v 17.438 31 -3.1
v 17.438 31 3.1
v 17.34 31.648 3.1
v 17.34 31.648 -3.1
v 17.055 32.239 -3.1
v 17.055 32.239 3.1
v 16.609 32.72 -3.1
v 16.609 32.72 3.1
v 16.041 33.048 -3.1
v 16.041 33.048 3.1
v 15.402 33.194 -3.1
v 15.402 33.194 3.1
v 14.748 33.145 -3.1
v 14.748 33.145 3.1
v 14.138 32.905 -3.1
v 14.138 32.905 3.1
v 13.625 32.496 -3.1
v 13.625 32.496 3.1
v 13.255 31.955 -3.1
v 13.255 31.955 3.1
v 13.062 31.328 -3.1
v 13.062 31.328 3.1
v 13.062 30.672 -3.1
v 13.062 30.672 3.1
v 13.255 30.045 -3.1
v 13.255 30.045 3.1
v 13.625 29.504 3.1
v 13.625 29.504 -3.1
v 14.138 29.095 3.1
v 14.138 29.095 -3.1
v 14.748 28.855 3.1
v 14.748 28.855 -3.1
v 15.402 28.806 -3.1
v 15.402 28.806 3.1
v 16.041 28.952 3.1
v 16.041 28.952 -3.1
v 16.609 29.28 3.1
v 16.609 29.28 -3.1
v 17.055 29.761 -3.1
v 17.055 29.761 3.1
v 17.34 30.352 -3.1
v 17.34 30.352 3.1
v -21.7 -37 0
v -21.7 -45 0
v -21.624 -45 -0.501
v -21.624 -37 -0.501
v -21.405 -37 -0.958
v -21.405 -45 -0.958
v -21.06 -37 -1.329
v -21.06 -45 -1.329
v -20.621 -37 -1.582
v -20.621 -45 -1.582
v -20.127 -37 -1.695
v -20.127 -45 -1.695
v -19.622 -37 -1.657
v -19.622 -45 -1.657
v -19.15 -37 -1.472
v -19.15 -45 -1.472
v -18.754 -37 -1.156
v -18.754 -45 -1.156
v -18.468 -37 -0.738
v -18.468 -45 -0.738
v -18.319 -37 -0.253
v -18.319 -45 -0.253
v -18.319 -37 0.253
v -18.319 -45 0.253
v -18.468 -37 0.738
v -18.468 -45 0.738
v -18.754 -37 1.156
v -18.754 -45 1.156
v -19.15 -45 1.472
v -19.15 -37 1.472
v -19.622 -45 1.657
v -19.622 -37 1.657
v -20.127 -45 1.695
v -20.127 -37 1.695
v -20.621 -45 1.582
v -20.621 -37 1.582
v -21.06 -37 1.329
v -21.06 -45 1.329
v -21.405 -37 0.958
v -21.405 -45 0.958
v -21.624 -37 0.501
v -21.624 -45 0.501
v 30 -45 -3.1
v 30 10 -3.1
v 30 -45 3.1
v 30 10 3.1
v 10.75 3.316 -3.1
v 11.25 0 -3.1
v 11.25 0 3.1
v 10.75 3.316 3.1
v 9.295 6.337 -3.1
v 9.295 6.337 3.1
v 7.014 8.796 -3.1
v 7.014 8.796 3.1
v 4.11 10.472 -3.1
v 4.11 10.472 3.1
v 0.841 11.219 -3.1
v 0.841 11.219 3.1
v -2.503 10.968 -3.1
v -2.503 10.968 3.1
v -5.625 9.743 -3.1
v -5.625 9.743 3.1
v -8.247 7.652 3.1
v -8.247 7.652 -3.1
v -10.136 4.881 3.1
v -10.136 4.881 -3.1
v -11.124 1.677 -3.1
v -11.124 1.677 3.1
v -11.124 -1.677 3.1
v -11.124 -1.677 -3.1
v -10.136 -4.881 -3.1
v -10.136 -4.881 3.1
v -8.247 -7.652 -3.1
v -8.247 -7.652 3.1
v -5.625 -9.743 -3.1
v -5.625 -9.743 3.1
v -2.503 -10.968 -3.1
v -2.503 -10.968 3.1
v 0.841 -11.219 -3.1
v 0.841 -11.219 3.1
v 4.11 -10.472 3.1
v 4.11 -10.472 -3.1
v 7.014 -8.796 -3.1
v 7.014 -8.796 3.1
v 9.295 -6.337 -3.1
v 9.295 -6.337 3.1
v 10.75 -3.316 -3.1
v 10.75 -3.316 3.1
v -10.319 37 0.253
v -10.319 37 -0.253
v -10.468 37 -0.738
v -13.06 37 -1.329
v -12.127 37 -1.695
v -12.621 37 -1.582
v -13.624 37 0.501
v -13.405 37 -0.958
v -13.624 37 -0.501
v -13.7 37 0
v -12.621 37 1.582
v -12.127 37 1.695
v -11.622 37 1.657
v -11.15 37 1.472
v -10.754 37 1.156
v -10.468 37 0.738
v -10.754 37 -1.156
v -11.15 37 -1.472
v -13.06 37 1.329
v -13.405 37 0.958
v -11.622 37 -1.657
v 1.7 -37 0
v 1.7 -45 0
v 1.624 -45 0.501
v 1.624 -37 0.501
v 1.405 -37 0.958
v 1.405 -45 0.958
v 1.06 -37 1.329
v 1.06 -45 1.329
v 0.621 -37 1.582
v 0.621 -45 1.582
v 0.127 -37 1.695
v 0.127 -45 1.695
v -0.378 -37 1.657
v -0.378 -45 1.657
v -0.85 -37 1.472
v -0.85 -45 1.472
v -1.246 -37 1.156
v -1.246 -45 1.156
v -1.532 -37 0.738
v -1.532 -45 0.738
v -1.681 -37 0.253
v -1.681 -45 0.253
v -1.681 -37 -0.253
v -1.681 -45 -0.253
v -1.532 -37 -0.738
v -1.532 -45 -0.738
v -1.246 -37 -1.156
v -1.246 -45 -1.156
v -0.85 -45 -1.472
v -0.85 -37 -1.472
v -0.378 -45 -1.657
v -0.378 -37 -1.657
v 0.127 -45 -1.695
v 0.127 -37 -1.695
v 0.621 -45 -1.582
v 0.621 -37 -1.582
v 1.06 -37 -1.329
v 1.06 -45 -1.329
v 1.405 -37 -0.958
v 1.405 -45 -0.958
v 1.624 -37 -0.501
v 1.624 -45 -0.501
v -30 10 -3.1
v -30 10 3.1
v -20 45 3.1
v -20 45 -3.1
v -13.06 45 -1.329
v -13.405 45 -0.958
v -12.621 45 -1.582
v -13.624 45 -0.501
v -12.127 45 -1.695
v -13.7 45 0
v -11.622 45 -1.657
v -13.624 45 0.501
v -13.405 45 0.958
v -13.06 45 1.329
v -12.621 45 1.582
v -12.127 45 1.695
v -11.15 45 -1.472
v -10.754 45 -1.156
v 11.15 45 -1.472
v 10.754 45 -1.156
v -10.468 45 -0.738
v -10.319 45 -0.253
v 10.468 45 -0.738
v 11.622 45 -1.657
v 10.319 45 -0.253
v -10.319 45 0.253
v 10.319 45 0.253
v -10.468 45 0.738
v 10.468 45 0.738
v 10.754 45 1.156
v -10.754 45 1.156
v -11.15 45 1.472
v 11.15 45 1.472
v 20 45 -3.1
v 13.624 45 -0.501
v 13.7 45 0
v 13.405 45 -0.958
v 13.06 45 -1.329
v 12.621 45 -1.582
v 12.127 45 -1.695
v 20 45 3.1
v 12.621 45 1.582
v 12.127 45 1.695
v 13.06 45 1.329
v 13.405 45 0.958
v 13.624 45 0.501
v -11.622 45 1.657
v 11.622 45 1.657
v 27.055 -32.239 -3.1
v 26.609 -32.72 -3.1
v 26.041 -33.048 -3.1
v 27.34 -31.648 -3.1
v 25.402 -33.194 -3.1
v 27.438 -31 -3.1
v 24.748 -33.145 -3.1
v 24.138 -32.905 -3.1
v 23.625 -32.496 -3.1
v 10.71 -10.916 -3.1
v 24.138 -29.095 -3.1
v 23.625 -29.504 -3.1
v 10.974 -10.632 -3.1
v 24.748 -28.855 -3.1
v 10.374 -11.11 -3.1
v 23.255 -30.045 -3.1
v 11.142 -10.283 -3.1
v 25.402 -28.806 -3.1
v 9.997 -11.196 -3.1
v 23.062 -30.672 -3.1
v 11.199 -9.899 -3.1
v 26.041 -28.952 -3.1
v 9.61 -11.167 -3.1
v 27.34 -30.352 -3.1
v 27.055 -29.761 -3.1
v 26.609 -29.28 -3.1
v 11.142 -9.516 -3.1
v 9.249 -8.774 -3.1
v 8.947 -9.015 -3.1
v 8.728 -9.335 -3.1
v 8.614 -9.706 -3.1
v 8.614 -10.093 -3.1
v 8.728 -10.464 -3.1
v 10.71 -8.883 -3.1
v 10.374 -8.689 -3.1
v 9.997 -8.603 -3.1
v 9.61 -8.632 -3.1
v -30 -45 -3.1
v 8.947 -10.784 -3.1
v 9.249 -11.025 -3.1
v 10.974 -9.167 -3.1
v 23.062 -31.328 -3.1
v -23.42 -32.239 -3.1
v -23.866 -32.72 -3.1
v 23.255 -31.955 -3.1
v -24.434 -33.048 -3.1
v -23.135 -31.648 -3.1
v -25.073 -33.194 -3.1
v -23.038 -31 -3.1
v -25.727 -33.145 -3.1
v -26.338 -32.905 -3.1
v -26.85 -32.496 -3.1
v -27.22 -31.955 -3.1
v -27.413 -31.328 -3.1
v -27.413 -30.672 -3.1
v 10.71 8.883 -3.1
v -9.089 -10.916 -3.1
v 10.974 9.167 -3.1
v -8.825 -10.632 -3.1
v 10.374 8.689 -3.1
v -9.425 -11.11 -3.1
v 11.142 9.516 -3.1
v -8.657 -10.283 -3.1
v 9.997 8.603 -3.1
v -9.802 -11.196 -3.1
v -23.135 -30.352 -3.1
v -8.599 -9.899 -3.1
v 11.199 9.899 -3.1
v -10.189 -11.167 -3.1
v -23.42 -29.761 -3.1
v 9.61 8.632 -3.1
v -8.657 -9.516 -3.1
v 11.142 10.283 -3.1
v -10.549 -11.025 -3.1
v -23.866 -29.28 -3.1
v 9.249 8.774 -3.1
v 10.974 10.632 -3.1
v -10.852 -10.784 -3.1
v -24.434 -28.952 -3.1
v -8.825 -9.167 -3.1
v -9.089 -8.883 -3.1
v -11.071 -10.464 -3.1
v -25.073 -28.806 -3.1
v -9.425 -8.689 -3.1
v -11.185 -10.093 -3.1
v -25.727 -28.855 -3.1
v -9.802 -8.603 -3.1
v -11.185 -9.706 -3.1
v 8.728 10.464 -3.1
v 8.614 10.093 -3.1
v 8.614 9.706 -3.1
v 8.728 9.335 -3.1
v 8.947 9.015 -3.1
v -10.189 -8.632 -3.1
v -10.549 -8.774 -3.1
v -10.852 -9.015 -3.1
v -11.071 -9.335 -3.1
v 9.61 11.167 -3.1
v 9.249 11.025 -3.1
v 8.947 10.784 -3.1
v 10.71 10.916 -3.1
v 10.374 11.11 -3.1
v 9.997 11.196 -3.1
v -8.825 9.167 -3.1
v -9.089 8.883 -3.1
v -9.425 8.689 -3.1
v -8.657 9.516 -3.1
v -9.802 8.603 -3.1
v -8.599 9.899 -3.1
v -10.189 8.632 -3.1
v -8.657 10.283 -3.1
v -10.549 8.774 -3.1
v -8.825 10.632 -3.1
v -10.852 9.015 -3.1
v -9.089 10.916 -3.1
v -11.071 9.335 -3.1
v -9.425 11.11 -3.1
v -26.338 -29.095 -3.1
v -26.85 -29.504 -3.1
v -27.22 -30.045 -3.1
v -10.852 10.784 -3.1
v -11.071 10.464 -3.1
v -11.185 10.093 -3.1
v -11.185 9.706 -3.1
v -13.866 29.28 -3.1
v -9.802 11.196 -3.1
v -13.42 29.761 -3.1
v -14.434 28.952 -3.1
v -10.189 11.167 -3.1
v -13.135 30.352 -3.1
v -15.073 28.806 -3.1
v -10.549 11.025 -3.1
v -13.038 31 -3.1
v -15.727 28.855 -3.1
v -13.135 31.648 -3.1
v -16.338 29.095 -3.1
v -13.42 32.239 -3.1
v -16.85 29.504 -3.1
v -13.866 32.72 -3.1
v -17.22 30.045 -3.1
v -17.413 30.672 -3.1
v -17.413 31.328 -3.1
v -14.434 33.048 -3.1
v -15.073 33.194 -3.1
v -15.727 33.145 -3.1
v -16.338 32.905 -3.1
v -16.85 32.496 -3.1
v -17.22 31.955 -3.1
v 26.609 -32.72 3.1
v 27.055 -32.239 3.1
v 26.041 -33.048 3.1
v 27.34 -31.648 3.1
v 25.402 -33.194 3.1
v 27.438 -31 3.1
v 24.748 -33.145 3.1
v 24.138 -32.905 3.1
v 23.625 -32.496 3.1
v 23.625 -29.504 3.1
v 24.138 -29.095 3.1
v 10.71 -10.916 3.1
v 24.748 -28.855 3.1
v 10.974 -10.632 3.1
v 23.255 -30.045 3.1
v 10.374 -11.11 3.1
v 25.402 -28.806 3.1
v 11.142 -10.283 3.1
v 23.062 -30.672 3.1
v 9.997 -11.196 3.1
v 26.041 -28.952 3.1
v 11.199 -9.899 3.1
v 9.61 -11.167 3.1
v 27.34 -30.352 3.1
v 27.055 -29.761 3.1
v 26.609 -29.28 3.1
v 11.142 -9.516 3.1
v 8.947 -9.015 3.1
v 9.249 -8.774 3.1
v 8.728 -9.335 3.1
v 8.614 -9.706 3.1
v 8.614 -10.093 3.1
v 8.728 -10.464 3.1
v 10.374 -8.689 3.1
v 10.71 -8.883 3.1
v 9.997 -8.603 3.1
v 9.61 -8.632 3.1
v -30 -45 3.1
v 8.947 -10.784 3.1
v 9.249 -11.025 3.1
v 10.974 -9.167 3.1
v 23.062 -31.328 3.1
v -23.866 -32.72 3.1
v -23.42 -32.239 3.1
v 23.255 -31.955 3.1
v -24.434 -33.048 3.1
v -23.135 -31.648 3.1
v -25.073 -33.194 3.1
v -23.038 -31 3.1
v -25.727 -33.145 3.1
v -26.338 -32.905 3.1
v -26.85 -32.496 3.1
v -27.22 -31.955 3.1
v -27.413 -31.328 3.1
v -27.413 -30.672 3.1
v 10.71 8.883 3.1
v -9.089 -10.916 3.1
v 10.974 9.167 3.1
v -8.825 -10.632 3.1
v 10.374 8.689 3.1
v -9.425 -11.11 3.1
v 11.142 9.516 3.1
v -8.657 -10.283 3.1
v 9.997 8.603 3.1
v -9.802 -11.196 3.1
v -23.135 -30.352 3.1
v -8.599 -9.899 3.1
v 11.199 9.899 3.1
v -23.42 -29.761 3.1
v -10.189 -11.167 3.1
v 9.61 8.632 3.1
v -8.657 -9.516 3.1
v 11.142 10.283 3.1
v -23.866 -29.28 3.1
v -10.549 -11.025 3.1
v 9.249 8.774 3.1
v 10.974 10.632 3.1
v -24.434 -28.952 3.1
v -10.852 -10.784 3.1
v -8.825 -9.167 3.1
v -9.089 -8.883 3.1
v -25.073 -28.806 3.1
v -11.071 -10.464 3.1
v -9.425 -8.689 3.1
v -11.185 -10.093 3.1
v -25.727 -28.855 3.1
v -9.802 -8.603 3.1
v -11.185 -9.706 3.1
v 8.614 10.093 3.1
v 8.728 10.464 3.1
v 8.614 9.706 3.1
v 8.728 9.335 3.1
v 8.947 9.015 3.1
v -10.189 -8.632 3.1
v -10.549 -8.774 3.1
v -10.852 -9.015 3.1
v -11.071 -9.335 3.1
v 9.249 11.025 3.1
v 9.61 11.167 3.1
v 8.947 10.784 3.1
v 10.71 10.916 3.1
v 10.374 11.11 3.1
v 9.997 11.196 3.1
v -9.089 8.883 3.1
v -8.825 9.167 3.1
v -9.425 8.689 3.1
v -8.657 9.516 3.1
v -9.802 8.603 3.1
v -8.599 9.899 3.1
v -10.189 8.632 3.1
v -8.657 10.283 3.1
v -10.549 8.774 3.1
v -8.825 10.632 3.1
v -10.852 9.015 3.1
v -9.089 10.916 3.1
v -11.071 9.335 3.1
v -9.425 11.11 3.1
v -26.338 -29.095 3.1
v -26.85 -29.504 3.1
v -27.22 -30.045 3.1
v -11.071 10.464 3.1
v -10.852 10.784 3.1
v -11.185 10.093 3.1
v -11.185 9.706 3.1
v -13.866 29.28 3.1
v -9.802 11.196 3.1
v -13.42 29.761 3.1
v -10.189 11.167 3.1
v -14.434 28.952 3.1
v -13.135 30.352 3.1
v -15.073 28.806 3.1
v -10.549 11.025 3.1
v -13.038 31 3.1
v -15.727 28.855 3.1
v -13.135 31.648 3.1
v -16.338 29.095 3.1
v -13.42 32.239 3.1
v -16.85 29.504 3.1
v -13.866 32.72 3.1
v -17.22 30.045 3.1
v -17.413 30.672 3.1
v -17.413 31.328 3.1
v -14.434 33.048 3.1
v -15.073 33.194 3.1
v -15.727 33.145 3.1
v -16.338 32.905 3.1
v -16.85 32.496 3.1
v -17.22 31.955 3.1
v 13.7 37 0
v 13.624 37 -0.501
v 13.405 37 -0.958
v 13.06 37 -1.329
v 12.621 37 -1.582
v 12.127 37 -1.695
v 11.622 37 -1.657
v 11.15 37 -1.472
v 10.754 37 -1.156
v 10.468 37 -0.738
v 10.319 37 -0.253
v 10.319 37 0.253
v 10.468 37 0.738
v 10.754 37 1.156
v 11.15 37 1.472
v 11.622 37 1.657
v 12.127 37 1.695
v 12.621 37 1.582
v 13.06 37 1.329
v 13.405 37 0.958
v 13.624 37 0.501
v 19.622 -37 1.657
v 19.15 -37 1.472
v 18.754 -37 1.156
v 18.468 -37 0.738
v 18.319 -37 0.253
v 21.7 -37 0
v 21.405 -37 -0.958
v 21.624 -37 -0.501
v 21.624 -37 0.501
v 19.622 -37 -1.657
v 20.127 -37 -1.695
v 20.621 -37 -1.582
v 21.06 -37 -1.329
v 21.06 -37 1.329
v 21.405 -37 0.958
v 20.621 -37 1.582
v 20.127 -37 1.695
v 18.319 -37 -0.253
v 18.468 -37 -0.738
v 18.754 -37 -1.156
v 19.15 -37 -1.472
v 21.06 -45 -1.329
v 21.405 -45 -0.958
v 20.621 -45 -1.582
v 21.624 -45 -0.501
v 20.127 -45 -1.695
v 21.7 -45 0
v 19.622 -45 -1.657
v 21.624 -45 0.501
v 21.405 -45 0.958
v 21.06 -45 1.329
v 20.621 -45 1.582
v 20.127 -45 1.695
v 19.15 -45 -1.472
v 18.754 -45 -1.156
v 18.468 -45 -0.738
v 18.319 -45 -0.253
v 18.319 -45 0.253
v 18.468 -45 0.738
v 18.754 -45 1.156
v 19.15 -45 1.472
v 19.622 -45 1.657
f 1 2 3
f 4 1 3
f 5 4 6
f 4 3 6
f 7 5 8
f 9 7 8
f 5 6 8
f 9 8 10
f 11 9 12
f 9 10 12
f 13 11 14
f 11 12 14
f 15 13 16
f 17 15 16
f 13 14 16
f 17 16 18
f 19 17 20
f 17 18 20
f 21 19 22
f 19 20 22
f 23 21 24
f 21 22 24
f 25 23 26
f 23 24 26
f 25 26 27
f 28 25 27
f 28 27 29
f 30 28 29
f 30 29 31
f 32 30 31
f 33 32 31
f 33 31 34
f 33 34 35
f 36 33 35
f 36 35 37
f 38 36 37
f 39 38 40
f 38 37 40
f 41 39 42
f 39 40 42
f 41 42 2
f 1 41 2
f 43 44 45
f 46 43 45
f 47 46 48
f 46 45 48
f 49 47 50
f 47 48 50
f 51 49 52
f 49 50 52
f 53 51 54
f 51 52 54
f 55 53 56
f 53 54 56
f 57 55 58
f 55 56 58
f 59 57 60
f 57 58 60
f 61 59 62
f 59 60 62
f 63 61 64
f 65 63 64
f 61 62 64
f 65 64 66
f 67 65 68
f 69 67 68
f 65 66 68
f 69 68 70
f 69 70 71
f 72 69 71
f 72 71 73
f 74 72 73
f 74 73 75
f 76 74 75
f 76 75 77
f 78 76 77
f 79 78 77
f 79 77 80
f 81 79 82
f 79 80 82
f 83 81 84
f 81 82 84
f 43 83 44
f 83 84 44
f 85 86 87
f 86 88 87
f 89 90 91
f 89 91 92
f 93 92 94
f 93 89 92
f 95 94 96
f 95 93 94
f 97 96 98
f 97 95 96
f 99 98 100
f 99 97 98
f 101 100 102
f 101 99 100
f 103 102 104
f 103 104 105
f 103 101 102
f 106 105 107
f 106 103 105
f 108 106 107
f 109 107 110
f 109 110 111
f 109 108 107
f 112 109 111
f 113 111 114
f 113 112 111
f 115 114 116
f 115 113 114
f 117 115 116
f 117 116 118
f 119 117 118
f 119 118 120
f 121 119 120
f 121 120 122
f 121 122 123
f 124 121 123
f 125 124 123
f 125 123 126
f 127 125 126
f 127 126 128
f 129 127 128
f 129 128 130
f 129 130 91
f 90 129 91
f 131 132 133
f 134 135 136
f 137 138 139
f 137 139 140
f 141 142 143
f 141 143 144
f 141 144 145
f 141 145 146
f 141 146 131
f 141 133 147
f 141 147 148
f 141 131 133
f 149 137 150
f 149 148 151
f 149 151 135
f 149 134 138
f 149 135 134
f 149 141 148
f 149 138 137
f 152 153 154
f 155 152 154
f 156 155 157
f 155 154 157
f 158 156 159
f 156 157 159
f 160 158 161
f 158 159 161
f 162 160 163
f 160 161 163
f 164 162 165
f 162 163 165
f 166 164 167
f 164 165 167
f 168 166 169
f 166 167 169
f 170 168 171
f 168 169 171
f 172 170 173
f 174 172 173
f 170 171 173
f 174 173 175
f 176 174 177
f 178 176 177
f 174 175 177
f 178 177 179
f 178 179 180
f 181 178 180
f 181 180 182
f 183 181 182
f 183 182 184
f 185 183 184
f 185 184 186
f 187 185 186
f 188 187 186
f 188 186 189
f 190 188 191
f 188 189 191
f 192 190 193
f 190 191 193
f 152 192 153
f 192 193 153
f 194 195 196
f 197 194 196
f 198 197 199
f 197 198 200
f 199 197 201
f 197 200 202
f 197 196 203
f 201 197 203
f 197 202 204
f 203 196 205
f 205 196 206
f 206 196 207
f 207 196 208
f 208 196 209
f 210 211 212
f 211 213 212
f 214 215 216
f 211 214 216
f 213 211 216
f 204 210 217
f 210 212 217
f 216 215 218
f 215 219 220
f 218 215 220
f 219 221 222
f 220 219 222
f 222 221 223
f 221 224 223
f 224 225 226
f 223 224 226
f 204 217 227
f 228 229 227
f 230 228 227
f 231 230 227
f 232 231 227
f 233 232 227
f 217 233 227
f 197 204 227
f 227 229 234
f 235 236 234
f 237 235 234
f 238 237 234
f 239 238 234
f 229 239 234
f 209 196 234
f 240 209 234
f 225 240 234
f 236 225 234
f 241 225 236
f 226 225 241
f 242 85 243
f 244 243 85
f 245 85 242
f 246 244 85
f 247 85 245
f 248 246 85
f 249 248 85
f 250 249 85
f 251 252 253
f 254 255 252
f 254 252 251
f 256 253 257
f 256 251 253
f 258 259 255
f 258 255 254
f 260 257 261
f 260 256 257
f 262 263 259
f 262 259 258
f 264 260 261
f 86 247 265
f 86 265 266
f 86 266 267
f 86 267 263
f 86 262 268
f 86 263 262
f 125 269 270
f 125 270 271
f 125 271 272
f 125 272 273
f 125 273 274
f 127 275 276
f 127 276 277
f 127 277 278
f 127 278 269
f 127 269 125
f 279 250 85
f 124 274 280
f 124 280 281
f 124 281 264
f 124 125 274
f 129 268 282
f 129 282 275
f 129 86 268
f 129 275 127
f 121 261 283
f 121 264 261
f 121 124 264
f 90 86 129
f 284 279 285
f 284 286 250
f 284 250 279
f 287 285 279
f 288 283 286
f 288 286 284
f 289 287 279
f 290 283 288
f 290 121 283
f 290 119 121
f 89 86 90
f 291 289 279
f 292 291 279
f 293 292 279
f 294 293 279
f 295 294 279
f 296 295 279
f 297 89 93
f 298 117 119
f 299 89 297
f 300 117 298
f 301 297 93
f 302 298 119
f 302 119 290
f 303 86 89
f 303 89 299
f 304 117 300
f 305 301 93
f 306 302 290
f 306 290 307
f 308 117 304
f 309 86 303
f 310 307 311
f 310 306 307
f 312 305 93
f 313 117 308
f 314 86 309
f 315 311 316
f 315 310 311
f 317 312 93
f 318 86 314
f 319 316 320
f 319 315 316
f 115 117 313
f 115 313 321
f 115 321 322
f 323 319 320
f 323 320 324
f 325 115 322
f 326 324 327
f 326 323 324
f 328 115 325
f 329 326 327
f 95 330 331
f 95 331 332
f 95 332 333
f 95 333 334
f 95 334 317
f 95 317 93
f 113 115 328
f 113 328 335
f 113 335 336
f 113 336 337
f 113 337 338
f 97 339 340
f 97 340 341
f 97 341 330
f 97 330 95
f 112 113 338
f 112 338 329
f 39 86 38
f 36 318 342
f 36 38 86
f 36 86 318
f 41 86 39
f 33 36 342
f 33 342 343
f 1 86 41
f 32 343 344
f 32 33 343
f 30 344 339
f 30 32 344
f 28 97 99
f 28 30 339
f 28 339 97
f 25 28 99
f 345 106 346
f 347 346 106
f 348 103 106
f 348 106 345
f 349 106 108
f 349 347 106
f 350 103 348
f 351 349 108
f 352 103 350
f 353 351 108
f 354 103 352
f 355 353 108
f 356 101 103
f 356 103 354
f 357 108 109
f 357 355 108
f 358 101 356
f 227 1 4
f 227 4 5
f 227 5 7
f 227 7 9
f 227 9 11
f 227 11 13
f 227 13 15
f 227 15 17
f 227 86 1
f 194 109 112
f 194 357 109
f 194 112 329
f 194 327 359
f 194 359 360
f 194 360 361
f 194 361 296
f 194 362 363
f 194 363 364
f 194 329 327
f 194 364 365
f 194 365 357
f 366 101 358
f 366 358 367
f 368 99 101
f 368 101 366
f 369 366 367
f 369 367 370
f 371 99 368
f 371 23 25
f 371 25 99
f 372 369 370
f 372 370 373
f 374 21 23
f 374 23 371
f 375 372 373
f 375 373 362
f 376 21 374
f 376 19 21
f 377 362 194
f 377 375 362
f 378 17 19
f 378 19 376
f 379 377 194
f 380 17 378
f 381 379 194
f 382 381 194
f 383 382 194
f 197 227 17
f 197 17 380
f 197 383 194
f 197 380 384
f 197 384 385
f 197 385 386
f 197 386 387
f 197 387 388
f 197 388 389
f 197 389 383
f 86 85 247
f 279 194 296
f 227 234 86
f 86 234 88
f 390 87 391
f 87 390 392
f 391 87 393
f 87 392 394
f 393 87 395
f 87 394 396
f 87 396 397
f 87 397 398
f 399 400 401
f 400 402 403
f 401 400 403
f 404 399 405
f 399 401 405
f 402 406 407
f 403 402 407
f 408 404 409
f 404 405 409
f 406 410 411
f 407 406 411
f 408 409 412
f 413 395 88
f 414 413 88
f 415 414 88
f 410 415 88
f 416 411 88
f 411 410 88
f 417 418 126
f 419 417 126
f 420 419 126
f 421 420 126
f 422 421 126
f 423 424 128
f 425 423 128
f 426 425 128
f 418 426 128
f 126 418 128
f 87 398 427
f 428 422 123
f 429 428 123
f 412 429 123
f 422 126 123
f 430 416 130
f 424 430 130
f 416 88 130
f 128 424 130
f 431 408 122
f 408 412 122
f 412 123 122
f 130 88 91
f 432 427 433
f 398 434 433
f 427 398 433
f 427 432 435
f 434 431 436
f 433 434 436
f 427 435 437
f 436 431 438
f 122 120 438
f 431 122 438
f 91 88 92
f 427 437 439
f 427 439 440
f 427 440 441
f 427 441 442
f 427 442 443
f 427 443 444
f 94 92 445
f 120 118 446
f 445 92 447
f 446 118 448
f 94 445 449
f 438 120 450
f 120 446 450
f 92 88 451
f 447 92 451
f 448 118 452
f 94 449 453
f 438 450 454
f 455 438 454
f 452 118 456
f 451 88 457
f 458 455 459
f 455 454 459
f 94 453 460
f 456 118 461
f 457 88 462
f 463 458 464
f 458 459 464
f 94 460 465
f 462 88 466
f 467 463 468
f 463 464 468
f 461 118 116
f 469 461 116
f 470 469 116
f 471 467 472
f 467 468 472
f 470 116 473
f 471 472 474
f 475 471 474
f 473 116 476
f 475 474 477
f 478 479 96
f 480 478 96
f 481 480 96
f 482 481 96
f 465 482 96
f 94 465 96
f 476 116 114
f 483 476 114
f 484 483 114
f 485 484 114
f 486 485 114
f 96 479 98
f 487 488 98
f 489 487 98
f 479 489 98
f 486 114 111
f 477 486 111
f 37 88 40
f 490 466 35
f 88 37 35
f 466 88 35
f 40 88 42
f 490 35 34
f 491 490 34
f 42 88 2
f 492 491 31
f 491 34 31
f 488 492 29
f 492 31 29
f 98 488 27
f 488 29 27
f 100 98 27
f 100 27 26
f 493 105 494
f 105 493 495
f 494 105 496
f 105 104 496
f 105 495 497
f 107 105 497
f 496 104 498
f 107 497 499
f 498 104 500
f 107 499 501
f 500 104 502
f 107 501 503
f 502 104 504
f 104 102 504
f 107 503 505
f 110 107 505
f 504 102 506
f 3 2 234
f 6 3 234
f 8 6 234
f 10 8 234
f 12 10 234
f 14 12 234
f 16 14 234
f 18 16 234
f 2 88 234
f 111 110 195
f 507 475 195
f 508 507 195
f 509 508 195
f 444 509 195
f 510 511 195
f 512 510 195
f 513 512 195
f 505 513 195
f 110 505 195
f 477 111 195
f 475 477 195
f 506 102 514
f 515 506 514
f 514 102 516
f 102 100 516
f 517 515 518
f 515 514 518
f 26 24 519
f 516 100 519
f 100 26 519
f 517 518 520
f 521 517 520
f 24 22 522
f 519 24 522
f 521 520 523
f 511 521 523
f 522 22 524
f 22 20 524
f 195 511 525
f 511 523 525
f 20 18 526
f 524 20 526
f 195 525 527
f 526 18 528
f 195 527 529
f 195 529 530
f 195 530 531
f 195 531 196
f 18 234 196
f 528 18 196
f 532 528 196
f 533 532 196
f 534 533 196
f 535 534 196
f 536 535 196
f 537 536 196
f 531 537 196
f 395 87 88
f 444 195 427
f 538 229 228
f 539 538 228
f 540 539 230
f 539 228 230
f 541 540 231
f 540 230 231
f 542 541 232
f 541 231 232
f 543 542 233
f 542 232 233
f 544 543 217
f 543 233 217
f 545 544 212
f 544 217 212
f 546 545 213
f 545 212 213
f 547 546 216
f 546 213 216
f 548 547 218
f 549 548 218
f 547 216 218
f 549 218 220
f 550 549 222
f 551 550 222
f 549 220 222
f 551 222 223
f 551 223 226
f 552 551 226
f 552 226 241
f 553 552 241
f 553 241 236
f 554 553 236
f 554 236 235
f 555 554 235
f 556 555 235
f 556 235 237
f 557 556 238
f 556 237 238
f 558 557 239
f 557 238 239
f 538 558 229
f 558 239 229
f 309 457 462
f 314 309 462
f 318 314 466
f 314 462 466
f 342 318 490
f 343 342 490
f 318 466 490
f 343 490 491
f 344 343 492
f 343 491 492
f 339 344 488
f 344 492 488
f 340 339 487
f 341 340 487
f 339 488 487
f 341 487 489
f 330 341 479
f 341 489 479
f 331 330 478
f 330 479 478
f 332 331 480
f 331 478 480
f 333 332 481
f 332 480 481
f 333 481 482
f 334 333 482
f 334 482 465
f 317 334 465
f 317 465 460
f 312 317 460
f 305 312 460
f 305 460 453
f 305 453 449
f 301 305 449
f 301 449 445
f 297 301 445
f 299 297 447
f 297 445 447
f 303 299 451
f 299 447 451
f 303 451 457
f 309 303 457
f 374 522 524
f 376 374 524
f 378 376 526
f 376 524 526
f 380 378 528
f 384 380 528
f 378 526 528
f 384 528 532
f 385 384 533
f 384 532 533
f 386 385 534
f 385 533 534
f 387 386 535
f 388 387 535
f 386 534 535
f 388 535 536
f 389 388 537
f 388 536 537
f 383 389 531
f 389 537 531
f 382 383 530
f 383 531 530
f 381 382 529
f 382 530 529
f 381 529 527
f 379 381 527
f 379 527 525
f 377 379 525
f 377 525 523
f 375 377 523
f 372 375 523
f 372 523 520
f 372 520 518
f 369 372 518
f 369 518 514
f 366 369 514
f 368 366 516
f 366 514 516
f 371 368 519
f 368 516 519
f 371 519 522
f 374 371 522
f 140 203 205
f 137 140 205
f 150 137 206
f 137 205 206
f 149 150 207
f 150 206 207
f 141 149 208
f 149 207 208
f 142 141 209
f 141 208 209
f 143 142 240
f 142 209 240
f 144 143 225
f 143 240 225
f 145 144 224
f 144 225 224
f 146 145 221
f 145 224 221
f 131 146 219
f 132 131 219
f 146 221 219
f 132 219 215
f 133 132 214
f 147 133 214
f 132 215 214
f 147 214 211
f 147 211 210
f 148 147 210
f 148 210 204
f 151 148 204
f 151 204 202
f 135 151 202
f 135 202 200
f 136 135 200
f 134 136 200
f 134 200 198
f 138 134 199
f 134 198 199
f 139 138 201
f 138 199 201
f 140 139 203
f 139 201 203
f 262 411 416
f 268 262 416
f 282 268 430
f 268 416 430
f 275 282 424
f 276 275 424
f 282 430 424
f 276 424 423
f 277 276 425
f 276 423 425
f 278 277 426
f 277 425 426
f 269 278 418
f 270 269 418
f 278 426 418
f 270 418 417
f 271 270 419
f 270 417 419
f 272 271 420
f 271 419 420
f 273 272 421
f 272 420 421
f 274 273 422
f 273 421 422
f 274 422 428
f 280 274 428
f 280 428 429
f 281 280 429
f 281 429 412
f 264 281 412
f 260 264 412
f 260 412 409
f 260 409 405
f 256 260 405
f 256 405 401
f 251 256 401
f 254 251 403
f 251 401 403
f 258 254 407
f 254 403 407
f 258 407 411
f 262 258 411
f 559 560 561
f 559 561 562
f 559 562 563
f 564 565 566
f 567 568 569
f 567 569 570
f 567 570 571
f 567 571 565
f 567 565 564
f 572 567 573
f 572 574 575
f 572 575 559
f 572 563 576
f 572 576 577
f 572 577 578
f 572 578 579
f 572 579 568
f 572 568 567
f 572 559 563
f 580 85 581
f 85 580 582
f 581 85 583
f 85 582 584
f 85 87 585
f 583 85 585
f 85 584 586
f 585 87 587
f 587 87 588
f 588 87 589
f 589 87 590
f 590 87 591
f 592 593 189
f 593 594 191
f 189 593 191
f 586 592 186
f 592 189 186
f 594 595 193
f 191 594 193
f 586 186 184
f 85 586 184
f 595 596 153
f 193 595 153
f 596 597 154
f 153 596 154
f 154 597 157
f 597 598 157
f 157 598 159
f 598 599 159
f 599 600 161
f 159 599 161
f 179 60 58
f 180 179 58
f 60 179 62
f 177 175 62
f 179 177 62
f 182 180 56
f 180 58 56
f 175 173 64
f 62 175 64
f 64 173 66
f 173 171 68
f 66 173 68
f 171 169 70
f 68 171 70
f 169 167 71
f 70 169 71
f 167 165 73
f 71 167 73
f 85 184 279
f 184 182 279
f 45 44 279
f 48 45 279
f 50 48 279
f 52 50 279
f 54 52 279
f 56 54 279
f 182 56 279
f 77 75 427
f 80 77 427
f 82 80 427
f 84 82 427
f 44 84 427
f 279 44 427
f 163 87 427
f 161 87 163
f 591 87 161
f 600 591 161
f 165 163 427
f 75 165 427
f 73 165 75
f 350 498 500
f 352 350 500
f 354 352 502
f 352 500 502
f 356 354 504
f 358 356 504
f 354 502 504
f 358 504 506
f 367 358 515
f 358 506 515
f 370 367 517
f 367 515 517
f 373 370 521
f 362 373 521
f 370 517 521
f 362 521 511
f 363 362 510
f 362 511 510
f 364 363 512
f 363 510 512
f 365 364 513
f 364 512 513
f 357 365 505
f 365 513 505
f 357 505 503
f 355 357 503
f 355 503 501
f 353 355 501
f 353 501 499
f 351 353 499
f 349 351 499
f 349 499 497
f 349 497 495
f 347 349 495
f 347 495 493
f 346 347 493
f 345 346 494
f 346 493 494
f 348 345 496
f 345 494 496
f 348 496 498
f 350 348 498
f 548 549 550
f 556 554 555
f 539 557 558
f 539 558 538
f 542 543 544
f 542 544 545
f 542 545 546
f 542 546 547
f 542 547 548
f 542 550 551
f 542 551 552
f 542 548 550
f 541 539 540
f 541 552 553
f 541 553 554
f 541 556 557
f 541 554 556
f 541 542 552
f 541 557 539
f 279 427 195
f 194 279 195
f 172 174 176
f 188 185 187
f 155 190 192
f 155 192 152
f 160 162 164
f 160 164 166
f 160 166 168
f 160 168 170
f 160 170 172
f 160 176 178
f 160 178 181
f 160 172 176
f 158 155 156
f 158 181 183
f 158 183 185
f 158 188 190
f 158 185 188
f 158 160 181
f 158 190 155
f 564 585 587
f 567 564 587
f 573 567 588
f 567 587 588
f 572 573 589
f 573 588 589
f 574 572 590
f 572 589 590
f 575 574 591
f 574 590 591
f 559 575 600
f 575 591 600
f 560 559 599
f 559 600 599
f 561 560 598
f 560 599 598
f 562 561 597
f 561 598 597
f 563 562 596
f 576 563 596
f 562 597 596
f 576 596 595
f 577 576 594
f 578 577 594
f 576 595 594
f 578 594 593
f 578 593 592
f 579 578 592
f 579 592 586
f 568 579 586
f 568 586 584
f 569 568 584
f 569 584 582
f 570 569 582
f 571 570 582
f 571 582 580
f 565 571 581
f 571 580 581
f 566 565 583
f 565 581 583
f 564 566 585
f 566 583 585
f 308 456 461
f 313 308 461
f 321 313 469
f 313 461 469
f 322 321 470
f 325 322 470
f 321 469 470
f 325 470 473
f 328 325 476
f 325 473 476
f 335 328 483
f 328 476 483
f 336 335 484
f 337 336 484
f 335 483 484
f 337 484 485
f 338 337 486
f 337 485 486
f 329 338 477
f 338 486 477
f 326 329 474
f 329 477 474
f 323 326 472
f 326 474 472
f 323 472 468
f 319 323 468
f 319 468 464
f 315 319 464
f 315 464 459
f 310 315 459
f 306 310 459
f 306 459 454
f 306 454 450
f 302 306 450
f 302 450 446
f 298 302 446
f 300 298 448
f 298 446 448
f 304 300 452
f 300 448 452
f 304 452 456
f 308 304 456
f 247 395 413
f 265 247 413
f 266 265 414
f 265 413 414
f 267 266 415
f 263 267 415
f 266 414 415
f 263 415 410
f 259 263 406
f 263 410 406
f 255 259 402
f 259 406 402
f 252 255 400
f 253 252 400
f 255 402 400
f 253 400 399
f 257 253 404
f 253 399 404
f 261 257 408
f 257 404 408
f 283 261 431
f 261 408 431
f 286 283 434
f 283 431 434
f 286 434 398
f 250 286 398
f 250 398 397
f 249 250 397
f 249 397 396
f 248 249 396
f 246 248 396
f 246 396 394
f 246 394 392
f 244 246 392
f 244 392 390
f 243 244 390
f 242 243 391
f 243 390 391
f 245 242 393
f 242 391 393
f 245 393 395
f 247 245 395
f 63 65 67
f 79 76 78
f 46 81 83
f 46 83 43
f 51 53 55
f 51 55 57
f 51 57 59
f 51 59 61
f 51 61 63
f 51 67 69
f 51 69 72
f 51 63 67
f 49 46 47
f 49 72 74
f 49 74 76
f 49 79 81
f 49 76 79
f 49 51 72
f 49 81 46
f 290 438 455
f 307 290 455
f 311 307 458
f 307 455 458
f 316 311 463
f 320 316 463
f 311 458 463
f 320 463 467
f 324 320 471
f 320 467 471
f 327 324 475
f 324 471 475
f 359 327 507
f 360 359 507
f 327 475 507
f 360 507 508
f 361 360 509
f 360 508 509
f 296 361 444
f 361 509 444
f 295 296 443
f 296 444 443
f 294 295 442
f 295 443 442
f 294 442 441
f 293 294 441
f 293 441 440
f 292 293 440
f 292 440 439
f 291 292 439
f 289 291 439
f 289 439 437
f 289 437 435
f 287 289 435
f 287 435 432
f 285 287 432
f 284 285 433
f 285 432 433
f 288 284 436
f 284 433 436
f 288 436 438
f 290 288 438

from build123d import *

# Parameters (mm, degrees)
EXTRUDE_1_4_DEPTH       = 3.1
CUT_EXTRUDE2_DEPTH      = 3.1
CUT_EXTRUDE2_DEPTH_BACK = 8
SKETCH3_R               = 11.25
SKETCH2_R               = 1.3
M3_DRILL_DEPTH          = 6.2
SKETCH4_R               = 1.7
M4_DRILL_DEPTH          = 8
SKETCH5_R               = 1.7
M4_DRILL2_DEPTH         = 8
SKETCH6_R               = 2.2
M4_THROUGH_DEPTH        = 6.2


with BuildPart() as part:
    # Sketch1 → 1/4 (new, symmetric)
    with BuildSketch(Plane.XY):
        Polygon((-20, 45), (20, 45), (30, 10), (30, -45), (-30, -45), (-30, 10), align=None)
    extrude(amount=EXTRUDE_1_4_DEPTH, both=True)

    # Sketch3 → Cut-Extrude2 (cut, two sides: drawn at the far end of the back side and taken through both)
    with BuildSketch(Plane.XY.offset(-CUT_EXTRUDE2_DEPTH_BACK)):
        Circle(SKETCH3_R)
    extrude(amount=CUT_EXTRUDE2_DEPTH + CUT_EXTRUDE2_DEPTH_BACK, mode=Mode.SUBTRACT)

    # Sketch2 → M3_DRILL (cut)
    with BuildSketch(Plane.XY.offset(3.1)):
        with Locations((-9.899494937, 9.899494937)):
            Circle(SKETCH2_R)
        with Locations((9.899494937, 9.899494937)):
            Circle(SKETCH2_R)
        with Locations((9.899494937, -9.899494937)):
            Circle(SKETCH2_R)
        with Locations((-9.899494937, -9.899494937)):
            Circle(SKETCH2_R)
    extrude(amount=-M3_DRILL_DEPTH, mode=Mode.SUBTRACT)

    # Sketch4 → M4_DRILL (cut)
    with BuildSketch(Plane(origin=(0, 45, 0), x_dir=(1, 0, 0), z_dir=(0, 1, 0))):
        with Locations(Location((-12, 0, 0), (0, 0, 180))):
            Circle(SKETCH4_R)
        with Locations((12, 0)):
            Circle(SKETCH4_R)
    extrude(amount=-M4_DRILL_DEPTH, mode=Mode.SUBTRACT)

    # Sketch5 → M4_DRILL2 (cut)
    with BuildSketch(Plane(origin=(0, -45, 0), x_dir=(-1, 0, 0), z_dir=(0, -1, 0))):
        with Locations(Location((-20, 0, 0), (0, 0, 180))):
            Circle(SKETCH5_R)
        with Locations((20, 0)):
            Circle(SKETCH5_R)
        with Locations(Location((0, 0, 0), (0, 0, 180))):
            Circle(SKETCH5_R)
    extrude(amount=-M4_DRILL2_DEPTH, mode=Mode.SUBTRACT)

    # Sketch6 → M4_through (cut)
    with BuildSketch(Plane.XY.offset(3.1)):
        with Locations((-25.2375, -31)):
            Circle(SKETCH6_R)
        with Locations((25.2375, -31)):
            Circle(SKETCH6_R)
        with Locations((-15.2375, 31)):
            Circle(SKETCH6_R)
        with Locations((15.2375, 31)):
            Circle(SKETCH6_R)
    extrude(amount=-M4_THROUGH_DEPTH, mode=Mode.SUBTRACT)


solid = part.part
